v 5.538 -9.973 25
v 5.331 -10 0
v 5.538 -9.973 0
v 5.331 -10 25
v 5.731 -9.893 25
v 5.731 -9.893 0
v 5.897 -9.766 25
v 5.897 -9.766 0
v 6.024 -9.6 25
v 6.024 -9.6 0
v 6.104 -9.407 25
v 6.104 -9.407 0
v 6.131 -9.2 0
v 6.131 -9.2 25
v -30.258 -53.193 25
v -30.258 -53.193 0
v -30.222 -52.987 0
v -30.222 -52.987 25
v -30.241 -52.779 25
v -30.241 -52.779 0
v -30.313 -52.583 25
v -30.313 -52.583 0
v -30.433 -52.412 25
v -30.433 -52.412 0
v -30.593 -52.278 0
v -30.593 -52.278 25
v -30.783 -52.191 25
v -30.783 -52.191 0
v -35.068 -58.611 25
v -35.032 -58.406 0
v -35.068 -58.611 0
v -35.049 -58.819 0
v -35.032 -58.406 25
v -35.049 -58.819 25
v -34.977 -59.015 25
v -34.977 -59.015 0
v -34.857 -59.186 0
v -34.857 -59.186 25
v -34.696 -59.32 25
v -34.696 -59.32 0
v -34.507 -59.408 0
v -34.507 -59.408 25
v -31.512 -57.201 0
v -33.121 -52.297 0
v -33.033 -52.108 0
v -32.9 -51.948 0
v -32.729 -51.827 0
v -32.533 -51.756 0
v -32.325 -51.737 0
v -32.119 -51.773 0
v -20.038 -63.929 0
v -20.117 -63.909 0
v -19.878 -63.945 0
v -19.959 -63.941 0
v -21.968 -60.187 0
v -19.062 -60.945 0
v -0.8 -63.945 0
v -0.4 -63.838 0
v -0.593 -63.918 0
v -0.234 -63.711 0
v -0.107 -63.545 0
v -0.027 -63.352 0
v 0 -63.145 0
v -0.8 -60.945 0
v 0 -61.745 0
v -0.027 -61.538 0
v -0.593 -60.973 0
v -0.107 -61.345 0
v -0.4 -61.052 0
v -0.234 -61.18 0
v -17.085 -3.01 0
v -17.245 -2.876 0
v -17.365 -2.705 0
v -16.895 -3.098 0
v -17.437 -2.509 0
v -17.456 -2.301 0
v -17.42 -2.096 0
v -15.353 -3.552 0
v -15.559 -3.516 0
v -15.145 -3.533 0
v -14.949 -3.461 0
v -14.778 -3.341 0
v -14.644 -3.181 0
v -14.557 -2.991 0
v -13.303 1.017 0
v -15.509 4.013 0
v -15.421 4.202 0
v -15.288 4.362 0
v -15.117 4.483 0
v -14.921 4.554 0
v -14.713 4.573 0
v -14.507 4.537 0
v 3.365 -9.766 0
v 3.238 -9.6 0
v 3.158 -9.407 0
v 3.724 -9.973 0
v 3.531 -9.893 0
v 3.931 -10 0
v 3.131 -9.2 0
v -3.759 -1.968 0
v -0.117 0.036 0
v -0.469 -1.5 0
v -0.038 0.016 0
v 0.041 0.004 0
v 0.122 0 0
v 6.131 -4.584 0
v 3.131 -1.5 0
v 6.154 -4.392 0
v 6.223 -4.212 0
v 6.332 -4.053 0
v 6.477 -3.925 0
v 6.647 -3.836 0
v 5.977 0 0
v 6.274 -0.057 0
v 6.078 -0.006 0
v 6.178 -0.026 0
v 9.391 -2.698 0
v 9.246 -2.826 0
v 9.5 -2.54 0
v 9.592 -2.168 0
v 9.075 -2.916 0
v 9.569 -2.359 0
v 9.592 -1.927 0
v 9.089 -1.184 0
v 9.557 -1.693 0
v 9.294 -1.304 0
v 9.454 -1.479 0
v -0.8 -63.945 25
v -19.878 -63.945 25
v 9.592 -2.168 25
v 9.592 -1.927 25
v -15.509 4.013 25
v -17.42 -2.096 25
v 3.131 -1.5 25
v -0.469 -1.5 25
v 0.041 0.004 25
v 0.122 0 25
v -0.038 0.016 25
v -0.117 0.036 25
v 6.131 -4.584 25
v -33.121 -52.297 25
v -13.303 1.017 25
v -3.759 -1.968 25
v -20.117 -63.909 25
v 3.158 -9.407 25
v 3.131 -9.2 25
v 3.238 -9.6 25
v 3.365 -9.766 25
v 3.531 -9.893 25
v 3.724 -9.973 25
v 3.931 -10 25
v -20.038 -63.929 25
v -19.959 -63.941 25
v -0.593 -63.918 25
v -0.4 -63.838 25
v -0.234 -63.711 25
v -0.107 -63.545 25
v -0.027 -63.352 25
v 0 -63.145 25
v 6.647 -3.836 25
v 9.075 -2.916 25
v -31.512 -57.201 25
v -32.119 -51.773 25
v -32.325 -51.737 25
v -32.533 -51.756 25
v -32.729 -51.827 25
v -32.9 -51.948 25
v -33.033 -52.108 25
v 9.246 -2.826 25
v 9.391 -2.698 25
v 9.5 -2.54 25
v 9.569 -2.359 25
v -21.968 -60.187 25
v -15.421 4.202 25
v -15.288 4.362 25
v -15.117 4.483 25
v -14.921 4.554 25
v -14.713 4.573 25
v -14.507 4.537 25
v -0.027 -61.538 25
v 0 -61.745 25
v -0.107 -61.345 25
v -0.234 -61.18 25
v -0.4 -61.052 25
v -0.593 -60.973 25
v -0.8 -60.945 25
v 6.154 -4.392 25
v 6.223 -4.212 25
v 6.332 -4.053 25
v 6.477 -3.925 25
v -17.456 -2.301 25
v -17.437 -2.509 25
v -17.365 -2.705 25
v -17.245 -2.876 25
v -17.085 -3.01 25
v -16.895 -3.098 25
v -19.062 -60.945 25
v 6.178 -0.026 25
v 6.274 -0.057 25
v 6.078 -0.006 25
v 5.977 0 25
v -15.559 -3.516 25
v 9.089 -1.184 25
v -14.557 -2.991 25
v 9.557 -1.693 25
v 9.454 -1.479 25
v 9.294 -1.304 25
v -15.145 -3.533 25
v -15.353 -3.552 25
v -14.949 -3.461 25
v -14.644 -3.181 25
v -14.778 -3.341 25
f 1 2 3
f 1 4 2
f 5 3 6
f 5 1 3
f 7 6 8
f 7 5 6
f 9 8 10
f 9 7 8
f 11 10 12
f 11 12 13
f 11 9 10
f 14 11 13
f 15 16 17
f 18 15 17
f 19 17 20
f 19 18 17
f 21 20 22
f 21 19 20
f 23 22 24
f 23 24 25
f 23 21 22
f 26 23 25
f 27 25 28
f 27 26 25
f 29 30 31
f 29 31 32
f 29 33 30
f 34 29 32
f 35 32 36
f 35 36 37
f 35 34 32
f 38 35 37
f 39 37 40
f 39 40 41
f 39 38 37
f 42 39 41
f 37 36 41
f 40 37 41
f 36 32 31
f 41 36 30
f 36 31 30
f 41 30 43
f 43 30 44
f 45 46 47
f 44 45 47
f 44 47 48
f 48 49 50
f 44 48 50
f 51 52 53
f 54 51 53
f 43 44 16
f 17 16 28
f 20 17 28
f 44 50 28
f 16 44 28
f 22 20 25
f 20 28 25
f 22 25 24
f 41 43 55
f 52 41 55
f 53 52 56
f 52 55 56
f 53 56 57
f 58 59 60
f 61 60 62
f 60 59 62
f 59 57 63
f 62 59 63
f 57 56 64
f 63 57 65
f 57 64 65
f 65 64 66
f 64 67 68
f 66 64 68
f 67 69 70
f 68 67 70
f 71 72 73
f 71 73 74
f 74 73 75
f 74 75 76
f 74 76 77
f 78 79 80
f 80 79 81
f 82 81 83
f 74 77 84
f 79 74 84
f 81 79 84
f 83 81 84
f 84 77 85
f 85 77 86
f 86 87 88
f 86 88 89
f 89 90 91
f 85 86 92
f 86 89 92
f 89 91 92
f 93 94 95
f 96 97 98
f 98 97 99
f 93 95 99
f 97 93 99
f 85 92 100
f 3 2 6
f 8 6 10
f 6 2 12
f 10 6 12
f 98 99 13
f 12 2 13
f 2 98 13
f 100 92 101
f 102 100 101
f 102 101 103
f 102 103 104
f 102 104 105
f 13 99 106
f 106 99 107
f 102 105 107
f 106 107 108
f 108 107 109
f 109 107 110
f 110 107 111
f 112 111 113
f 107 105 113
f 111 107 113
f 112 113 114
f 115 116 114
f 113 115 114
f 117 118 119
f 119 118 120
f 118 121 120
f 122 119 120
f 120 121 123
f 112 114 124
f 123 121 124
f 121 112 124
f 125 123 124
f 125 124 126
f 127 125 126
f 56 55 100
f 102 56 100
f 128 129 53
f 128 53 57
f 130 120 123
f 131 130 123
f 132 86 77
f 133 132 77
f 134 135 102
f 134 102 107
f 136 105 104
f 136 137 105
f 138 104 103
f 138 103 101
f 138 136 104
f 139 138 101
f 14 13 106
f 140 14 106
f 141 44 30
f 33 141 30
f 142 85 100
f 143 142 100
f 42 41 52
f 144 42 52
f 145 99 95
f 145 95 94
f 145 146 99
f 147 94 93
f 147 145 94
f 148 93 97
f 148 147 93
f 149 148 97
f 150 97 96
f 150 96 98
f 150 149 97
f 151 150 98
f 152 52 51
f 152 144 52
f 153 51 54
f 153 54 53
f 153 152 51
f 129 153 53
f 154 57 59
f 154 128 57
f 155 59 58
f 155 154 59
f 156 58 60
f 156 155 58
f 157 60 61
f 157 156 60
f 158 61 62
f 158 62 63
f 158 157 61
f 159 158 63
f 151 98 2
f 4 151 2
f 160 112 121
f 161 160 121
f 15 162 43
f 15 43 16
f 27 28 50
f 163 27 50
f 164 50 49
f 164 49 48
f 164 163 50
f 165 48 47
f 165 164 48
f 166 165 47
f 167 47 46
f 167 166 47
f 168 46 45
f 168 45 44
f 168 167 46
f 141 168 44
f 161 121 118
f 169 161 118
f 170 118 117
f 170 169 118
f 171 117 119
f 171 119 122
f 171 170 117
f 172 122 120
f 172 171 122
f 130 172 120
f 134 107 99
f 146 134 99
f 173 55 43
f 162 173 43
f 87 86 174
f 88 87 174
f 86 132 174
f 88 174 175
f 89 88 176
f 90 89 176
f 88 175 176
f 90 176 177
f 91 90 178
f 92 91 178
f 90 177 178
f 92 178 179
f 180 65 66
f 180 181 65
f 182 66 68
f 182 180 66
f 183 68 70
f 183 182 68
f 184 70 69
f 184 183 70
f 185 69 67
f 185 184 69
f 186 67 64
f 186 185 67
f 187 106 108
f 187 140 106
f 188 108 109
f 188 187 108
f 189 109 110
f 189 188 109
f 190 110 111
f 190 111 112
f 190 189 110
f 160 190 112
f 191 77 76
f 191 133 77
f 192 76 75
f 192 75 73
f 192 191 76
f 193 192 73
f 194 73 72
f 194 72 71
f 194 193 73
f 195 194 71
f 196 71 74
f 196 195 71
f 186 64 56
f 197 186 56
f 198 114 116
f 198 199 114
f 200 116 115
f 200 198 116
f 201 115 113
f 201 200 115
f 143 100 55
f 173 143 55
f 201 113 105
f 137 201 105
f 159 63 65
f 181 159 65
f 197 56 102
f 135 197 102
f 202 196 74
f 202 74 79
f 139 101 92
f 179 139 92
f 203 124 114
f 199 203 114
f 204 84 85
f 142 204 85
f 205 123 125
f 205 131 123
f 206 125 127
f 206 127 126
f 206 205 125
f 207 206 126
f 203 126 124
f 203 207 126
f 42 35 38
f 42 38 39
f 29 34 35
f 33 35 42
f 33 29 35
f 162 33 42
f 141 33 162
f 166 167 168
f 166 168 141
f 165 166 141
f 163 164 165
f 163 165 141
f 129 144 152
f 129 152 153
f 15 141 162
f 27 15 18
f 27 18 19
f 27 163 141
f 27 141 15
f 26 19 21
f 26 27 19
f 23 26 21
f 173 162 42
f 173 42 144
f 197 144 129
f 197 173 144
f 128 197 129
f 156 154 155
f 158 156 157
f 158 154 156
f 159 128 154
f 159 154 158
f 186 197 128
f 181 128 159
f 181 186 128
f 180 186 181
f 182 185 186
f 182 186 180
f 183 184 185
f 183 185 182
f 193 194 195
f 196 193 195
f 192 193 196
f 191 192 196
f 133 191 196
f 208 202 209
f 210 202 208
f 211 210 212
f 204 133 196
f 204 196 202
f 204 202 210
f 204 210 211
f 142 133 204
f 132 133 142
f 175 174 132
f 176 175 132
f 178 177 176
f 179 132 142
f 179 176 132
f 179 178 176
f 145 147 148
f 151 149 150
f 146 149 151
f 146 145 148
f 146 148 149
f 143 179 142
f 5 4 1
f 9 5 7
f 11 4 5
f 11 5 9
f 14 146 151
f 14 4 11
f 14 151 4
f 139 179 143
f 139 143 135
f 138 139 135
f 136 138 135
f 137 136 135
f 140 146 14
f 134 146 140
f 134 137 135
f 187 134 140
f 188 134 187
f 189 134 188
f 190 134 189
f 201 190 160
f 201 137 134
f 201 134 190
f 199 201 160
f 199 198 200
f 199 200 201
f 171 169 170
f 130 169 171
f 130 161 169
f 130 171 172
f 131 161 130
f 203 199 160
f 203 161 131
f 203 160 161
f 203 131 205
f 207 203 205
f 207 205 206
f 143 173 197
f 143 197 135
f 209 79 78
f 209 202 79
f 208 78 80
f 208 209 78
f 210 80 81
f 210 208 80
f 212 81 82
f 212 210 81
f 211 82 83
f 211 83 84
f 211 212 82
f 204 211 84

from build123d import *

# Parameters (mm, degrees)
F1_DEPTH = 25
F2_R     = 0.8


# Not quite as in the source:
# - a feature names something its author has since deleted; it is built from what else it names


with BuildPart() as f1:
    # F0 (on Top) → F1 (new body)
    with BuildSketch(Plane.XY):
        Polygon((-15.2705168036, 4.776119403), (-17.6585765051, -2.8591389988), (-14.7953546044, -3.7546613869), (-13.302817291, 1.0173751143), (-3.7587442887, -1.9676995126), (-21.9676995126, -60.1865448263), (-31.5117725148, -57.2014701994), (-30.0192352014, -52.4294336983), (-32.8824571021, -51.5339113102), (-35.2705168036, -59.169169712), (-20, -63.945289115), (-19.0616978853, -60.945289115), (-0.4691510573, -1.5), (3.1308489427, -1.5), (3.1308489427, -10), (6.1308489427, -10), (6.1308489427, -4.0311980993), (6.1308489427, 0), (0, 0), align=None)
        Polygon((0, -60.945289115), (-19.0616978853, -60.945289115), (-20, -63.945289115), (0, -63.945289115), align=None)
        Polygon((9.5918557882, -1.385692507), (6.1308489427, 0), (6.1308489427, -4.0311980993), (9.5918557882, -2.7201510966), align=None)
    extrude(amount=F1_DEPTH)

    # F2
    f2_edges = [f1.edges().sort_by_distance(p)[0] for p in [
        (-15.270517, 4.776119, 12.5),
        (-17.658577, -2.859139, 12.5),
        (-14.795355, -3.754661, 12.5),
        (-32.882457, -51.533911, 12.5),
        (-35.270517, -59.16917, 12.5),
        (-30.019235, -52.429434, 12.5),
        (-20, -63.945289, 12.5),
        (6.130849, -10, 12.5),
        (3.130849, -10, 12.5),
        (0, -60.945289, 12.5),
        (0, -63.945289, 12.5),
        (9.591856, -1.385693, 12.5),
        (9.591856, -2.720151, 12.5),
        (0, 0, 12.5),
        (6.130849, 0, 12.5),
        (6.130849, -4.031198, 12.5),
    ]]
    fillet(f2_edges, radius=F2_R)


solid = f1.part
